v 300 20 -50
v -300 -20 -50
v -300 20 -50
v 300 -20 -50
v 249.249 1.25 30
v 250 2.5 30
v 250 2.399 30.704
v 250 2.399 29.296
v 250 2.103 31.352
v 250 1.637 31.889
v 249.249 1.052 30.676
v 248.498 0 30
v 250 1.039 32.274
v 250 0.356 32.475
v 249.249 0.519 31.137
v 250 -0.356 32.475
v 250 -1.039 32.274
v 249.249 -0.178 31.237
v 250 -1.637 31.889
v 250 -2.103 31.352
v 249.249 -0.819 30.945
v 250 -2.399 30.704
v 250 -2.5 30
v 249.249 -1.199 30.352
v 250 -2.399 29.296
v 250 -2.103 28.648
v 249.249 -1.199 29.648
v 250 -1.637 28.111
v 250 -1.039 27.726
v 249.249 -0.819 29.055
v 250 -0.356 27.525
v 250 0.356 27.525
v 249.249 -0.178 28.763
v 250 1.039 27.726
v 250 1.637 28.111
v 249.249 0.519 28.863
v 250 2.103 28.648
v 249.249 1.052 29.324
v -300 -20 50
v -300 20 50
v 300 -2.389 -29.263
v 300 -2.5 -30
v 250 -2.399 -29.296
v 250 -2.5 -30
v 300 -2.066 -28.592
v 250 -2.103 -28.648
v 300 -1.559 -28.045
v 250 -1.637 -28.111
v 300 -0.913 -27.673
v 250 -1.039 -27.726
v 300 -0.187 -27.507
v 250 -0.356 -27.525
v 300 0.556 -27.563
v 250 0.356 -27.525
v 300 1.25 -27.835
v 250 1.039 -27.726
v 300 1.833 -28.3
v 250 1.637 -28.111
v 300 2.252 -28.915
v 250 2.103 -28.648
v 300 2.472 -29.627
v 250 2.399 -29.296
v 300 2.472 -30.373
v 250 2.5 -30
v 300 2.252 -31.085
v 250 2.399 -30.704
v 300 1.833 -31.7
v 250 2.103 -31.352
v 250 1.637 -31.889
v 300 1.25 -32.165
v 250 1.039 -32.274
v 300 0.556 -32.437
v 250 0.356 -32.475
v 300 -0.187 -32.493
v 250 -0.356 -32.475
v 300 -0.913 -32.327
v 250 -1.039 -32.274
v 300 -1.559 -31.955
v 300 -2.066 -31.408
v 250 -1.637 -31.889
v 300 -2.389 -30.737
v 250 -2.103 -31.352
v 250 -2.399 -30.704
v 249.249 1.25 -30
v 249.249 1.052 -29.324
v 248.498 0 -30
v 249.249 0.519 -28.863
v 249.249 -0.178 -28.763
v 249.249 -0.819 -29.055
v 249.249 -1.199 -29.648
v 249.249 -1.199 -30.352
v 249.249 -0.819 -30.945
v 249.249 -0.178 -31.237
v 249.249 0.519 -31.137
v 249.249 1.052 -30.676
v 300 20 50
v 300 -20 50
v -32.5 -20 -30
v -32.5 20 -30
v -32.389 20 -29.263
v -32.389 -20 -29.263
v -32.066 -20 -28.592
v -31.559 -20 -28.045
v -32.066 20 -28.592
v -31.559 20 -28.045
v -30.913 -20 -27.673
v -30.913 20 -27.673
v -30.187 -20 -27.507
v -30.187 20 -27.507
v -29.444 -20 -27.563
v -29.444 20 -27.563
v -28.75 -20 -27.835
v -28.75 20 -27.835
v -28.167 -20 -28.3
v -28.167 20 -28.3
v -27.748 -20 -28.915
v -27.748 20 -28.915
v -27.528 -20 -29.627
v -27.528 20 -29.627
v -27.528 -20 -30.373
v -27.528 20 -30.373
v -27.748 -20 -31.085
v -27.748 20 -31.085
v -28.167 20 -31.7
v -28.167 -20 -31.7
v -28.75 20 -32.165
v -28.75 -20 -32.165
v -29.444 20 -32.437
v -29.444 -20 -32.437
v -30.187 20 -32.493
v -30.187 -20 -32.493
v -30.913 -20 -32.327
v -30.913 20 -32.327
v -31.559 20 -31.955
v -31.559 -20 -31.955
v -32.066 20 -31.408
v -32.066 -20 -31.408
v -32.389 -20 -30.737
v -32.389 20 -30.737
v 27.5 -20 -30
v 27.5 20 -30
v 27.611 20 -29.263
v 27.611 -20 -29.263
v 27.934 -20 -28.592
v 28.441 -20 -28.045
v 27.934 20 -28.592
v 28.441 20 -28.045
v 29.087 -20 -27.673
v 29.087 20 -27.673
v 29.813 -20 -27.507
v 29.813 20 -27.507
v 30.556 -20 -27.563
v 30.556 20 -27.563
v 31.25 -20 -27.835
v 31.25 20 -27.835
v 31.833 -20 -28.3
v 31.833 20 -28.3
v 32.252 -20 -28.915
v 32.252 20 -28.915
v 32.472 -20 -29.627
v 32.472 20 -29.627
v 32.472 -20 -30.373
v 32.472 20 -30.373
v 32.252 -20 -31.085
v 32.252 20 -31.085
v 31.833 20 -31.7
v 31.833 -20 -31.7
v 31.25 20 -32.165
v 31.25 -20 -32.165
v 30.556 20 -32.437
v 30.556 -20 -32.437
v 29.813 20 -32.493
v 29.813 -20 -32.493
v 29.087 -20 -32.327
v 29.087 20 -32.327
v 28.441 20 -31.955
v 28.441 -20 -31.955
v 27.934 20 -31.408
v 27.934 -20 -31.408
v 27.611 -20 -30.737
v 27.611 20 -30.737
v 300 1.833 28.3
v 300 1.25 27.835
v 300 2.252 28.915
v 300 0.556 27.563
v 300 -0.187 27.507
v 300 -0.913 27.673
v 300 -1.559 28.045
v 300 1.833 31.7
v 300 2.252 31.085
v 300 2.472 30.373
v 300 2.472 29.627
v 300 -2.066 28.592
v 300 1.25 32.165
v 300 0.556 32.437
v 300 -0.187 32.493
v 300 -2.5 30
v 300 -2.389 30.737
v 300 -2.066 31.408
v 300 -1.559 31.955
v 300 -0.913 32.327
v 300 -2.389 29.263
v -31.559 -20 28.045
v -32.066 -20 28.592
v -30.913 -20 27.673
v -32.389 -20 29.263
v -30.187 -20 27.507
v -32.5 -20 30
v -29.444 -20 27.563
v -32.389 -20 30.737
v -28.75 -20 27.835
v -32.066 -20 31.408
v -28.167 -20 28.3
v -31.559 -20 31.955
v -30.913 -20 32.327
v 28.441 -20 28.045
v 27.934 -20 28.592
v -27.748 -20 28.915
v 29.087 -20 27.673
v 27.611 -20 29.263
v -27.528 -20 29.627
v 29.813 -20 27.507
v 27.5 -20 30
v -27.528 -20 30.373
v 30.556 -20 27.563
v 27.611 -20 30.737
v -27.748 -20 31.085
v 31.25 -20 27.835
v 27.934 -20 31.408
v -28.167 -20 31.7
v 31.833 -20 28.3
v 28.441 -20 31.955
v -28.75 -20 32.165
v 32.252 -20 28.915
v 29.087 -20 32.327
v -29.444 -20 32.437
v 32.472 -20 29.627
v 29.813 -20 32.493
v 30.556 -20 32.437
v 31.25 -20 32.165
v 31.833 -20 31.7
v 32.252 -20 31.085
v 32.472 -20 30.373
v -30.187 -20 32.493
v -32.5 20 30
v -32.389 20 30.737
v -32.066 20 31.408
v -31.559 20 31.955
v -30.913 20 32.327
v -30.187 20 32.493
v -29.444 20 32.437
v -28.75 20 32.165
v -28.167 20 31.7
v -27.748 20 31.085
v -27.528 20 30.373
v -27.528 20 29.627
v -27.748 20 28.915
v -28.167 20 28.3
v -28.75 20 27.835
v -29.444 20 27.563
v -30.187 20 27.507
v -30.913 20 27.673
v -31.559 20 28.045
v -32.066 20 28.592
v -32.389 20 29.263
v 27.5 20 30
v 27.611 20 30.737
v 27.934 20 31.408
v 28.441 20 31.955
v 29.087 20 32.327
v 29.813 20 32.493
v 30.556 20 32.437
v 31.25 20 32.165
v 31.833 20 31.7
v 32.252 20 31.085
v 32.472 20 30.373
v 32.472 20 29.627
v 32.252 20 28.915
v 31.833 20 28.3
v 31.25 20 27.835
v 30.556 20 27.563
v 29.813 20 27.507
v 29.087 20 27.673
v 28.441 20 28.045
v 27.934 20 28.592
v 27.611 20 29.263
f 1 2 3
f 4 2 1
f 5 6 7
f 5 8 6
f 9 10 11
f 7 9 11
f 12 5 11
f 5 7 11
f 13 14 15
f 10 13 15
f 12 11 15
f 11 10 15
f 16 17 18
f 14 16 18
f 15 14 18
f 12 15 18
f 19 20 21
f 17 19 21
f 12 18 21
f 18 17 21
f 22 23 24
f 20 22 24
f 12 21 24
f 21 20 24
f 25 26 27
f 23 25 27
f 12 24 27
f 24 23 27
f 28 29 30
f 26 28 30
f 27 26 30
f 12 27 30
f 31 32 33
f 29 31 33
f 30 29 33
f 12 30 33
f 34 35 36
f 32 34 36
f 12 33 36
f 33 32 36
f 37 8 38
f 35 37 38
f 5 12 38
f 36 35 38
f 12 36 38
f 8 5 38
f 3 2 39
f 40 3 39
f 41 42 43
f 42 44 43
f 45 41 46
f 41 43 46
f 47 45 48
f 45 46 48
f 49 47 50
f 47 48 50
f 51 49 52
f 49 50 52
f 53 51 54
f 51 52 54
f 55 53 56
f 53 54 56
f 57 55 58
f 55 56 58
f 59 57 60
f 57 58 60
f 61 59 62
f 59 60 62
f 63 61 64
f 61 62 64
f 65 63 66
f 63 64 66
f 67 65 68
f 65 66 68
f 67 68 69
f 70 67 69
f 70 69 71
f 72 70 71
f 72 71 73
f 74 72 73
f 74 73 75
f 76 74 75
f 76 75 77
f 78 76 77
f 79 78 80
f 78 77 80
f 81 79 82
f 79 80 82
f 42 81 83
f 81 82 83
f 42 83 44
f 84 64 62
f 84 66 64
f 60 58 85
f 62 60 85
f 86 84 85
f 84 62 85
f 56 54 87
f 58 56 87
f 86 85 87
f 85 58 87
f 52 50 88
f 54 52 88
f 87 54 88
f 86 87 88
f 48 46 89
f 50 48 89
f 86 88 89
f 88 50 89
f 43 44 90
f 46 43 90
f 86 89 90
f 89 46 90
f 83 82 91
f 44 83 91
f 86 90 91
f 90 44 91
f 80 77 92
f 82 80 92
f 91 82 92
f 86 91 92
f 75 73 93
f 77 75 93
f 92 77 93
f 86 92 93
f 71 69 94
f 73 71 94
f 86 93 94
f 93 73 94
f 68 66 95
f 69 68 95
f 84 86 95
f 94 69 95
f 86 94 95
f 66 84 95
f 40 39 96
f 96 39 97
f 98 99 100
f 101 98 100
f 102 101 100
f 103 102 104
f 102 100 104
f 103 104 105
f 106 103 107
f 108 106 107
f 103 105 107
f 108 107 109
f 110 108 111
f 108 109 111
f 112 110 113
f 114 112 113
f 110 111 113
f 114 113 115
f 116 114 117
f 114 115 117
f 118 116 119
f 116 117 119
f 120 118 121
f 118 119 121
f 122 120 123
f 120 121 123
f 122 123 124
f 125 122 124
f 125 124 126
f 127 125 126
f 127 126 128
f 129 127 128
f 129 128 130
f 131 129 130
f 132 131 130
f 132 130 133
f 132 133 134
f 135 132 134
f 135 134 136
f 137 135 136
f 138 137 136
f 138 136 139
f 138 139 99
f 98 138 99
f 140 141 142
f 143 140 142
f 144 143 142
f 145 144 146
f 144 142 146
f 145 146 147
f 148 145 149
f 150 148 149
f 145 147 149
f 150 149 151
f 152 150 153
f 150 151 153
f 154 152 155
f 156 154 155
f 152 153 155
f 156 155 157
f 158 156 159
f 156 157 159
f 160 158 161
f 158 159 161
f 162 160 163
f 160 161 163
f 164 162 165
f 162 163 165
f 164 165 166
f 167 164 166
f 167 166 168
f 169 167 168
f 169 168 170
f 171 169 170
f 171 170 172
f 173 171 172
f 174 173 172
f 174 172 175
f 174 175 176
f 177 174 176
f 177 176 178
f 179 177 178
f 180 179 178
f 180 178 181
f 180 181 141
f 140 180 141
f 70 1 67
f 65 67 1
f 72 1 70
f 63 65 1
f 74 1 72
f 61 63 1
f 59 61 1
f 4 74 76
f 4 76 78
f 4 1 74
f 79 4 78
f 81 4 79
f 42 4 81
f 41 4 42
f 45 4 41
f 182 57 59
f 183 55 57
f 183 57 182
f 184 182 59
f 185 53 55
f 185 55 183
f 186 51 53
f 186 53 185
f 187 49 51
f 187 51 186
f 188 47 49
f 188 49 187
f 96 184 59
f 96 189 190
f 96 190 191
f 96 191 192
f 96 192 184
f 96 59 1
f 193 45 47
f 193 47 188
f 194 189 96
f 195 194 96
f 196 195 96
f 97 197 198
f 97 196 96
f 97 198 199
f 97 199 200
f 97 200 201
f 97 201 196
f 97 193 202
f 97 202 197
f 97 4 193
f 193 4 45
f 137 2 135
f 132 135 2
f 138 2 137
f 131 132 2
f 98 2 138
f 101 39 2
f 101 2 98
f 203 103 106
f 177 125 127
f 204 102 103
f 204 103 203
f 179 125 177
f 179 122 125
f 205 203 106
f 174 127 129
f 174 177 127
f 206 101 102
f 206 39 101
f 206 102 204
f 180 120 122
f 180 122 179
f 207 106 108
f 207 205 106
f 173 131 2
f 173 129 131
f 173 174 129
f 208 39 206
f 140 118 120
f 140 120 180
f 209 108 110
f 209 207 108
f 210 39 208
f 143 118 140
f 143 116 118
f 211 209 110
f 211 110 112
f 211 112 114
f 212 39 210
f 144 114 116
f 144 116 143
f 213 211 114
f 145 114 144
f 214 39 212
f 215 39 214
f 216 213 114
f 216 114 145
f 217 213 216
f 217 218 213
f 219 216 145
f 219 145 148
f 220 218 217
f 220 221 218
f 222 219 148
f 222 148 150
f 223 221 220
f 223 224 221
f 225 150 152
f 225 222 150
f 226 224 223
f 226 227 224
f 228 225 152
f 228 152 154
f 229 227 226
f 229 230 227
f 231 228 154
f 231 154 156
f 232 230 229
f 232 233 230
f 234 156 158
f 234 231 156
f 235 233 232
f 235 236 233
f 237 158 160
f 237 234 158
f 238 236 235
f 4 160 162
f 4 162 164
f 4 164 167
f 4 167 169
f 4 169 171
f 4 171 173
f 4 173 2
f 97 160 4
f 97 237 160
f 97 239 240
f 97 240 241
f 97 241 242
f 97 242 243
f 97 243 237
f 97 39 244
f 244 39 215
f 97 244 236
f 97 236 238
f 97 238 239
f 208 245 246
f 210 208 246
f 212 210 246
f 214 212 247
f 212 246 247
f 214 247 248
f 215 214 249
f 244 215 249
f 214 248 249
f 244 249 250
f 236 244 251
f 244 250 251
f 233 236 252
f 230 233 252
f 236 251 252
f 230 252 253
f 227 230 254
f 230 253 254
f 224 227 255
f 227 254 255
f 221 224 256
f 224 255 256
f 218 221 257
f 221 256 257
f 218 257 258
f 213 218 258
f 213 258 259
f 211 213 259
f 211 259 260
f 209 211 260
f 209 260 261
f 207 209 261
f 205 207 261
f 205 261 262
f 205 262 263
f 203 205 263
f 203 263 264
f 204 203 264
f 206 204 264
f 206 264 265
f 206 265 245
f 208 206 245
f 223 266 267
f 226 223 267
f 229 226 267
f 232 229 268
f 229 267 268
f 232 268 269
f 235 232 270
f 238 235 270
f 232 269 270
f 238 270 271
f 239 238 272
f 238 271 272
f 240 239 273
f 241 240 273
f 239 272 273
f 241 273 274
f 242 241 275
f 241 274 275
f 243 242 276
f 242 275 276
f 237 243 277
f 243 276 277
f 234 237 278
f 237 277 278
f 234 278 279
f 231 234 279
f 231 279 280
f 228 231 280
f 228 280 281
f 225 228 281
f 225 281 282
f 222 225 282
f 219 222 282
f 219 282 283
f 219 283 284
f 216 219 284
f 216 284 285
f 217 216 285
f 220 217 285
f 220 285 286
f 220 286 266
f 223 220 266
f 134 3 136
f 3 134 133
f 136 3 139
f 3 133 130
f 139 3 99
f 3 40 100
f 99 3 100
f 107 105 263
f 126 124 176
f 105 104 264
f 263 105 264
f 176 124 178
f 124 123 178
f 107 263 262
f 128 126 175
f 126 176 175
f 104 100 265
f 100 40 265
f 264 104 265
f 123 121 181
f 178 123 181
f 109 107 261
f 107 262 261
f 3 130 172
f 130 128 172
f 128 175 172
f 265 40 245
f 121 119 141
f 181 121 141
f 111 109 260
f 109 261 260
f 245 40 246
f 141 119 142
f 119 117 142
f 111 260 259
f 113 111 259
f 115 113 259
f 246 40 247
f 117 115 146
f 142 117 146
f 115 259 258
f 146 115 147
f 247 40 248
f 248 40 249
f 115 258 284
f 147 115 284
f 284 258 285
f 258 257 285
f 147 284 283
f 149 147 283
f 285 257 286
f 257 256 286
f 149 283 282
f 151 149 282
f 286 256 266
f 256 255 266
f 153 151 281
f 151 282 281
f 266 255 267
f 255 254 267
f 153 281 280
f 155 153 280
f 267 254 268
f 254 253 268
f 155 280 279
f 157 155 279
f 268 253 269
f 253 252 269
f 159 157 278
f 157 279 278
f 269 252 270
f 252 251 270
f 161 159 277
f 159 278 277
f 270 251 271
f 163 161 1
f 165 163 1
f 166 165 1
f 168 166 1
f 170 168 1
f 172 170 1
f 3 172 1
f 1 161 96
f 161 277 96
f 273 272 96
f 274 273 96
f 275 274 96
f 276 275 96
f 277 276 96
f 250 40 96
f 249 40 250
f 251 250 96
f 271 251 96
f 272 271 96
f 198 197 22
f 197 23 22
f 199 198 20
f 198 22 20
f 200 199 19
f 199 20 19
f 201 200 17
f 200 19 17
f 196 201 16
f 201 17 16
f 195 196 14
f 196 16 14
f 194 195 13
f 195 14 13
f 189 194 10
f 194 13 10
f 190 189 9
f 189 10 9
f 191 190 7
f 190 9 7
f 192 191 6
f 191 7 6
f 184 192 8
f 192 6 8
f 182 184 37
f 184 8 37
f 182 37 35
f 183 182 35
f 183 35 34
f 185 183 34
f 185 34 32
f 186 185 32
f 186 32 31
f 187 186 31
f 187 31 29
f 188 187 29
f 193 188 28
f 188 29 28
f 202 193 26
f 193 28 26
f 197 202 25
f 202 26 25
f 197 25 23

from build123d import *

# Parameters (mm, degrees)
F0_W     = 600
F0_H     = 100
F1_DEPTH = 20
F3_D     = 5
F5_D     = 5
F5_DEPTH = 50
F5_TIP   = 1.5021515476


# Not quite as in the source:
# - a feature names something its author has since deleted; it is built from what else it names


with BuildPart() as f1:
    # F0 (on Front) → F1 (new body, symmetric)
    with BuildSketch(Plane.XZ):
        Rectangle(F0_W, F0_H)
    extrude(amount=F1_DEPTH, both=True)

    # F3 (through all)
    with Locations(Plane.XZ.offset(20)):
        with Locations((-30, 30), (30, 30), (-30, -30), (30, -30)):
            Hole(F3_D / 2)

    # F5
    with Locations(Plane.YZ.offset(300)):
        with Locations((0, 30), (0, -30)):
            Hole(F5_D / 2, depth=F5_DEPTH)
            with Locations((0, 0, -(F5_DEPTH + F5_TIP / 2))):  # 118° drill point
                Cone(0, F5_D / 2, F5_TIP, mode=Mode.SUBTRACT)


solid = f1.part
